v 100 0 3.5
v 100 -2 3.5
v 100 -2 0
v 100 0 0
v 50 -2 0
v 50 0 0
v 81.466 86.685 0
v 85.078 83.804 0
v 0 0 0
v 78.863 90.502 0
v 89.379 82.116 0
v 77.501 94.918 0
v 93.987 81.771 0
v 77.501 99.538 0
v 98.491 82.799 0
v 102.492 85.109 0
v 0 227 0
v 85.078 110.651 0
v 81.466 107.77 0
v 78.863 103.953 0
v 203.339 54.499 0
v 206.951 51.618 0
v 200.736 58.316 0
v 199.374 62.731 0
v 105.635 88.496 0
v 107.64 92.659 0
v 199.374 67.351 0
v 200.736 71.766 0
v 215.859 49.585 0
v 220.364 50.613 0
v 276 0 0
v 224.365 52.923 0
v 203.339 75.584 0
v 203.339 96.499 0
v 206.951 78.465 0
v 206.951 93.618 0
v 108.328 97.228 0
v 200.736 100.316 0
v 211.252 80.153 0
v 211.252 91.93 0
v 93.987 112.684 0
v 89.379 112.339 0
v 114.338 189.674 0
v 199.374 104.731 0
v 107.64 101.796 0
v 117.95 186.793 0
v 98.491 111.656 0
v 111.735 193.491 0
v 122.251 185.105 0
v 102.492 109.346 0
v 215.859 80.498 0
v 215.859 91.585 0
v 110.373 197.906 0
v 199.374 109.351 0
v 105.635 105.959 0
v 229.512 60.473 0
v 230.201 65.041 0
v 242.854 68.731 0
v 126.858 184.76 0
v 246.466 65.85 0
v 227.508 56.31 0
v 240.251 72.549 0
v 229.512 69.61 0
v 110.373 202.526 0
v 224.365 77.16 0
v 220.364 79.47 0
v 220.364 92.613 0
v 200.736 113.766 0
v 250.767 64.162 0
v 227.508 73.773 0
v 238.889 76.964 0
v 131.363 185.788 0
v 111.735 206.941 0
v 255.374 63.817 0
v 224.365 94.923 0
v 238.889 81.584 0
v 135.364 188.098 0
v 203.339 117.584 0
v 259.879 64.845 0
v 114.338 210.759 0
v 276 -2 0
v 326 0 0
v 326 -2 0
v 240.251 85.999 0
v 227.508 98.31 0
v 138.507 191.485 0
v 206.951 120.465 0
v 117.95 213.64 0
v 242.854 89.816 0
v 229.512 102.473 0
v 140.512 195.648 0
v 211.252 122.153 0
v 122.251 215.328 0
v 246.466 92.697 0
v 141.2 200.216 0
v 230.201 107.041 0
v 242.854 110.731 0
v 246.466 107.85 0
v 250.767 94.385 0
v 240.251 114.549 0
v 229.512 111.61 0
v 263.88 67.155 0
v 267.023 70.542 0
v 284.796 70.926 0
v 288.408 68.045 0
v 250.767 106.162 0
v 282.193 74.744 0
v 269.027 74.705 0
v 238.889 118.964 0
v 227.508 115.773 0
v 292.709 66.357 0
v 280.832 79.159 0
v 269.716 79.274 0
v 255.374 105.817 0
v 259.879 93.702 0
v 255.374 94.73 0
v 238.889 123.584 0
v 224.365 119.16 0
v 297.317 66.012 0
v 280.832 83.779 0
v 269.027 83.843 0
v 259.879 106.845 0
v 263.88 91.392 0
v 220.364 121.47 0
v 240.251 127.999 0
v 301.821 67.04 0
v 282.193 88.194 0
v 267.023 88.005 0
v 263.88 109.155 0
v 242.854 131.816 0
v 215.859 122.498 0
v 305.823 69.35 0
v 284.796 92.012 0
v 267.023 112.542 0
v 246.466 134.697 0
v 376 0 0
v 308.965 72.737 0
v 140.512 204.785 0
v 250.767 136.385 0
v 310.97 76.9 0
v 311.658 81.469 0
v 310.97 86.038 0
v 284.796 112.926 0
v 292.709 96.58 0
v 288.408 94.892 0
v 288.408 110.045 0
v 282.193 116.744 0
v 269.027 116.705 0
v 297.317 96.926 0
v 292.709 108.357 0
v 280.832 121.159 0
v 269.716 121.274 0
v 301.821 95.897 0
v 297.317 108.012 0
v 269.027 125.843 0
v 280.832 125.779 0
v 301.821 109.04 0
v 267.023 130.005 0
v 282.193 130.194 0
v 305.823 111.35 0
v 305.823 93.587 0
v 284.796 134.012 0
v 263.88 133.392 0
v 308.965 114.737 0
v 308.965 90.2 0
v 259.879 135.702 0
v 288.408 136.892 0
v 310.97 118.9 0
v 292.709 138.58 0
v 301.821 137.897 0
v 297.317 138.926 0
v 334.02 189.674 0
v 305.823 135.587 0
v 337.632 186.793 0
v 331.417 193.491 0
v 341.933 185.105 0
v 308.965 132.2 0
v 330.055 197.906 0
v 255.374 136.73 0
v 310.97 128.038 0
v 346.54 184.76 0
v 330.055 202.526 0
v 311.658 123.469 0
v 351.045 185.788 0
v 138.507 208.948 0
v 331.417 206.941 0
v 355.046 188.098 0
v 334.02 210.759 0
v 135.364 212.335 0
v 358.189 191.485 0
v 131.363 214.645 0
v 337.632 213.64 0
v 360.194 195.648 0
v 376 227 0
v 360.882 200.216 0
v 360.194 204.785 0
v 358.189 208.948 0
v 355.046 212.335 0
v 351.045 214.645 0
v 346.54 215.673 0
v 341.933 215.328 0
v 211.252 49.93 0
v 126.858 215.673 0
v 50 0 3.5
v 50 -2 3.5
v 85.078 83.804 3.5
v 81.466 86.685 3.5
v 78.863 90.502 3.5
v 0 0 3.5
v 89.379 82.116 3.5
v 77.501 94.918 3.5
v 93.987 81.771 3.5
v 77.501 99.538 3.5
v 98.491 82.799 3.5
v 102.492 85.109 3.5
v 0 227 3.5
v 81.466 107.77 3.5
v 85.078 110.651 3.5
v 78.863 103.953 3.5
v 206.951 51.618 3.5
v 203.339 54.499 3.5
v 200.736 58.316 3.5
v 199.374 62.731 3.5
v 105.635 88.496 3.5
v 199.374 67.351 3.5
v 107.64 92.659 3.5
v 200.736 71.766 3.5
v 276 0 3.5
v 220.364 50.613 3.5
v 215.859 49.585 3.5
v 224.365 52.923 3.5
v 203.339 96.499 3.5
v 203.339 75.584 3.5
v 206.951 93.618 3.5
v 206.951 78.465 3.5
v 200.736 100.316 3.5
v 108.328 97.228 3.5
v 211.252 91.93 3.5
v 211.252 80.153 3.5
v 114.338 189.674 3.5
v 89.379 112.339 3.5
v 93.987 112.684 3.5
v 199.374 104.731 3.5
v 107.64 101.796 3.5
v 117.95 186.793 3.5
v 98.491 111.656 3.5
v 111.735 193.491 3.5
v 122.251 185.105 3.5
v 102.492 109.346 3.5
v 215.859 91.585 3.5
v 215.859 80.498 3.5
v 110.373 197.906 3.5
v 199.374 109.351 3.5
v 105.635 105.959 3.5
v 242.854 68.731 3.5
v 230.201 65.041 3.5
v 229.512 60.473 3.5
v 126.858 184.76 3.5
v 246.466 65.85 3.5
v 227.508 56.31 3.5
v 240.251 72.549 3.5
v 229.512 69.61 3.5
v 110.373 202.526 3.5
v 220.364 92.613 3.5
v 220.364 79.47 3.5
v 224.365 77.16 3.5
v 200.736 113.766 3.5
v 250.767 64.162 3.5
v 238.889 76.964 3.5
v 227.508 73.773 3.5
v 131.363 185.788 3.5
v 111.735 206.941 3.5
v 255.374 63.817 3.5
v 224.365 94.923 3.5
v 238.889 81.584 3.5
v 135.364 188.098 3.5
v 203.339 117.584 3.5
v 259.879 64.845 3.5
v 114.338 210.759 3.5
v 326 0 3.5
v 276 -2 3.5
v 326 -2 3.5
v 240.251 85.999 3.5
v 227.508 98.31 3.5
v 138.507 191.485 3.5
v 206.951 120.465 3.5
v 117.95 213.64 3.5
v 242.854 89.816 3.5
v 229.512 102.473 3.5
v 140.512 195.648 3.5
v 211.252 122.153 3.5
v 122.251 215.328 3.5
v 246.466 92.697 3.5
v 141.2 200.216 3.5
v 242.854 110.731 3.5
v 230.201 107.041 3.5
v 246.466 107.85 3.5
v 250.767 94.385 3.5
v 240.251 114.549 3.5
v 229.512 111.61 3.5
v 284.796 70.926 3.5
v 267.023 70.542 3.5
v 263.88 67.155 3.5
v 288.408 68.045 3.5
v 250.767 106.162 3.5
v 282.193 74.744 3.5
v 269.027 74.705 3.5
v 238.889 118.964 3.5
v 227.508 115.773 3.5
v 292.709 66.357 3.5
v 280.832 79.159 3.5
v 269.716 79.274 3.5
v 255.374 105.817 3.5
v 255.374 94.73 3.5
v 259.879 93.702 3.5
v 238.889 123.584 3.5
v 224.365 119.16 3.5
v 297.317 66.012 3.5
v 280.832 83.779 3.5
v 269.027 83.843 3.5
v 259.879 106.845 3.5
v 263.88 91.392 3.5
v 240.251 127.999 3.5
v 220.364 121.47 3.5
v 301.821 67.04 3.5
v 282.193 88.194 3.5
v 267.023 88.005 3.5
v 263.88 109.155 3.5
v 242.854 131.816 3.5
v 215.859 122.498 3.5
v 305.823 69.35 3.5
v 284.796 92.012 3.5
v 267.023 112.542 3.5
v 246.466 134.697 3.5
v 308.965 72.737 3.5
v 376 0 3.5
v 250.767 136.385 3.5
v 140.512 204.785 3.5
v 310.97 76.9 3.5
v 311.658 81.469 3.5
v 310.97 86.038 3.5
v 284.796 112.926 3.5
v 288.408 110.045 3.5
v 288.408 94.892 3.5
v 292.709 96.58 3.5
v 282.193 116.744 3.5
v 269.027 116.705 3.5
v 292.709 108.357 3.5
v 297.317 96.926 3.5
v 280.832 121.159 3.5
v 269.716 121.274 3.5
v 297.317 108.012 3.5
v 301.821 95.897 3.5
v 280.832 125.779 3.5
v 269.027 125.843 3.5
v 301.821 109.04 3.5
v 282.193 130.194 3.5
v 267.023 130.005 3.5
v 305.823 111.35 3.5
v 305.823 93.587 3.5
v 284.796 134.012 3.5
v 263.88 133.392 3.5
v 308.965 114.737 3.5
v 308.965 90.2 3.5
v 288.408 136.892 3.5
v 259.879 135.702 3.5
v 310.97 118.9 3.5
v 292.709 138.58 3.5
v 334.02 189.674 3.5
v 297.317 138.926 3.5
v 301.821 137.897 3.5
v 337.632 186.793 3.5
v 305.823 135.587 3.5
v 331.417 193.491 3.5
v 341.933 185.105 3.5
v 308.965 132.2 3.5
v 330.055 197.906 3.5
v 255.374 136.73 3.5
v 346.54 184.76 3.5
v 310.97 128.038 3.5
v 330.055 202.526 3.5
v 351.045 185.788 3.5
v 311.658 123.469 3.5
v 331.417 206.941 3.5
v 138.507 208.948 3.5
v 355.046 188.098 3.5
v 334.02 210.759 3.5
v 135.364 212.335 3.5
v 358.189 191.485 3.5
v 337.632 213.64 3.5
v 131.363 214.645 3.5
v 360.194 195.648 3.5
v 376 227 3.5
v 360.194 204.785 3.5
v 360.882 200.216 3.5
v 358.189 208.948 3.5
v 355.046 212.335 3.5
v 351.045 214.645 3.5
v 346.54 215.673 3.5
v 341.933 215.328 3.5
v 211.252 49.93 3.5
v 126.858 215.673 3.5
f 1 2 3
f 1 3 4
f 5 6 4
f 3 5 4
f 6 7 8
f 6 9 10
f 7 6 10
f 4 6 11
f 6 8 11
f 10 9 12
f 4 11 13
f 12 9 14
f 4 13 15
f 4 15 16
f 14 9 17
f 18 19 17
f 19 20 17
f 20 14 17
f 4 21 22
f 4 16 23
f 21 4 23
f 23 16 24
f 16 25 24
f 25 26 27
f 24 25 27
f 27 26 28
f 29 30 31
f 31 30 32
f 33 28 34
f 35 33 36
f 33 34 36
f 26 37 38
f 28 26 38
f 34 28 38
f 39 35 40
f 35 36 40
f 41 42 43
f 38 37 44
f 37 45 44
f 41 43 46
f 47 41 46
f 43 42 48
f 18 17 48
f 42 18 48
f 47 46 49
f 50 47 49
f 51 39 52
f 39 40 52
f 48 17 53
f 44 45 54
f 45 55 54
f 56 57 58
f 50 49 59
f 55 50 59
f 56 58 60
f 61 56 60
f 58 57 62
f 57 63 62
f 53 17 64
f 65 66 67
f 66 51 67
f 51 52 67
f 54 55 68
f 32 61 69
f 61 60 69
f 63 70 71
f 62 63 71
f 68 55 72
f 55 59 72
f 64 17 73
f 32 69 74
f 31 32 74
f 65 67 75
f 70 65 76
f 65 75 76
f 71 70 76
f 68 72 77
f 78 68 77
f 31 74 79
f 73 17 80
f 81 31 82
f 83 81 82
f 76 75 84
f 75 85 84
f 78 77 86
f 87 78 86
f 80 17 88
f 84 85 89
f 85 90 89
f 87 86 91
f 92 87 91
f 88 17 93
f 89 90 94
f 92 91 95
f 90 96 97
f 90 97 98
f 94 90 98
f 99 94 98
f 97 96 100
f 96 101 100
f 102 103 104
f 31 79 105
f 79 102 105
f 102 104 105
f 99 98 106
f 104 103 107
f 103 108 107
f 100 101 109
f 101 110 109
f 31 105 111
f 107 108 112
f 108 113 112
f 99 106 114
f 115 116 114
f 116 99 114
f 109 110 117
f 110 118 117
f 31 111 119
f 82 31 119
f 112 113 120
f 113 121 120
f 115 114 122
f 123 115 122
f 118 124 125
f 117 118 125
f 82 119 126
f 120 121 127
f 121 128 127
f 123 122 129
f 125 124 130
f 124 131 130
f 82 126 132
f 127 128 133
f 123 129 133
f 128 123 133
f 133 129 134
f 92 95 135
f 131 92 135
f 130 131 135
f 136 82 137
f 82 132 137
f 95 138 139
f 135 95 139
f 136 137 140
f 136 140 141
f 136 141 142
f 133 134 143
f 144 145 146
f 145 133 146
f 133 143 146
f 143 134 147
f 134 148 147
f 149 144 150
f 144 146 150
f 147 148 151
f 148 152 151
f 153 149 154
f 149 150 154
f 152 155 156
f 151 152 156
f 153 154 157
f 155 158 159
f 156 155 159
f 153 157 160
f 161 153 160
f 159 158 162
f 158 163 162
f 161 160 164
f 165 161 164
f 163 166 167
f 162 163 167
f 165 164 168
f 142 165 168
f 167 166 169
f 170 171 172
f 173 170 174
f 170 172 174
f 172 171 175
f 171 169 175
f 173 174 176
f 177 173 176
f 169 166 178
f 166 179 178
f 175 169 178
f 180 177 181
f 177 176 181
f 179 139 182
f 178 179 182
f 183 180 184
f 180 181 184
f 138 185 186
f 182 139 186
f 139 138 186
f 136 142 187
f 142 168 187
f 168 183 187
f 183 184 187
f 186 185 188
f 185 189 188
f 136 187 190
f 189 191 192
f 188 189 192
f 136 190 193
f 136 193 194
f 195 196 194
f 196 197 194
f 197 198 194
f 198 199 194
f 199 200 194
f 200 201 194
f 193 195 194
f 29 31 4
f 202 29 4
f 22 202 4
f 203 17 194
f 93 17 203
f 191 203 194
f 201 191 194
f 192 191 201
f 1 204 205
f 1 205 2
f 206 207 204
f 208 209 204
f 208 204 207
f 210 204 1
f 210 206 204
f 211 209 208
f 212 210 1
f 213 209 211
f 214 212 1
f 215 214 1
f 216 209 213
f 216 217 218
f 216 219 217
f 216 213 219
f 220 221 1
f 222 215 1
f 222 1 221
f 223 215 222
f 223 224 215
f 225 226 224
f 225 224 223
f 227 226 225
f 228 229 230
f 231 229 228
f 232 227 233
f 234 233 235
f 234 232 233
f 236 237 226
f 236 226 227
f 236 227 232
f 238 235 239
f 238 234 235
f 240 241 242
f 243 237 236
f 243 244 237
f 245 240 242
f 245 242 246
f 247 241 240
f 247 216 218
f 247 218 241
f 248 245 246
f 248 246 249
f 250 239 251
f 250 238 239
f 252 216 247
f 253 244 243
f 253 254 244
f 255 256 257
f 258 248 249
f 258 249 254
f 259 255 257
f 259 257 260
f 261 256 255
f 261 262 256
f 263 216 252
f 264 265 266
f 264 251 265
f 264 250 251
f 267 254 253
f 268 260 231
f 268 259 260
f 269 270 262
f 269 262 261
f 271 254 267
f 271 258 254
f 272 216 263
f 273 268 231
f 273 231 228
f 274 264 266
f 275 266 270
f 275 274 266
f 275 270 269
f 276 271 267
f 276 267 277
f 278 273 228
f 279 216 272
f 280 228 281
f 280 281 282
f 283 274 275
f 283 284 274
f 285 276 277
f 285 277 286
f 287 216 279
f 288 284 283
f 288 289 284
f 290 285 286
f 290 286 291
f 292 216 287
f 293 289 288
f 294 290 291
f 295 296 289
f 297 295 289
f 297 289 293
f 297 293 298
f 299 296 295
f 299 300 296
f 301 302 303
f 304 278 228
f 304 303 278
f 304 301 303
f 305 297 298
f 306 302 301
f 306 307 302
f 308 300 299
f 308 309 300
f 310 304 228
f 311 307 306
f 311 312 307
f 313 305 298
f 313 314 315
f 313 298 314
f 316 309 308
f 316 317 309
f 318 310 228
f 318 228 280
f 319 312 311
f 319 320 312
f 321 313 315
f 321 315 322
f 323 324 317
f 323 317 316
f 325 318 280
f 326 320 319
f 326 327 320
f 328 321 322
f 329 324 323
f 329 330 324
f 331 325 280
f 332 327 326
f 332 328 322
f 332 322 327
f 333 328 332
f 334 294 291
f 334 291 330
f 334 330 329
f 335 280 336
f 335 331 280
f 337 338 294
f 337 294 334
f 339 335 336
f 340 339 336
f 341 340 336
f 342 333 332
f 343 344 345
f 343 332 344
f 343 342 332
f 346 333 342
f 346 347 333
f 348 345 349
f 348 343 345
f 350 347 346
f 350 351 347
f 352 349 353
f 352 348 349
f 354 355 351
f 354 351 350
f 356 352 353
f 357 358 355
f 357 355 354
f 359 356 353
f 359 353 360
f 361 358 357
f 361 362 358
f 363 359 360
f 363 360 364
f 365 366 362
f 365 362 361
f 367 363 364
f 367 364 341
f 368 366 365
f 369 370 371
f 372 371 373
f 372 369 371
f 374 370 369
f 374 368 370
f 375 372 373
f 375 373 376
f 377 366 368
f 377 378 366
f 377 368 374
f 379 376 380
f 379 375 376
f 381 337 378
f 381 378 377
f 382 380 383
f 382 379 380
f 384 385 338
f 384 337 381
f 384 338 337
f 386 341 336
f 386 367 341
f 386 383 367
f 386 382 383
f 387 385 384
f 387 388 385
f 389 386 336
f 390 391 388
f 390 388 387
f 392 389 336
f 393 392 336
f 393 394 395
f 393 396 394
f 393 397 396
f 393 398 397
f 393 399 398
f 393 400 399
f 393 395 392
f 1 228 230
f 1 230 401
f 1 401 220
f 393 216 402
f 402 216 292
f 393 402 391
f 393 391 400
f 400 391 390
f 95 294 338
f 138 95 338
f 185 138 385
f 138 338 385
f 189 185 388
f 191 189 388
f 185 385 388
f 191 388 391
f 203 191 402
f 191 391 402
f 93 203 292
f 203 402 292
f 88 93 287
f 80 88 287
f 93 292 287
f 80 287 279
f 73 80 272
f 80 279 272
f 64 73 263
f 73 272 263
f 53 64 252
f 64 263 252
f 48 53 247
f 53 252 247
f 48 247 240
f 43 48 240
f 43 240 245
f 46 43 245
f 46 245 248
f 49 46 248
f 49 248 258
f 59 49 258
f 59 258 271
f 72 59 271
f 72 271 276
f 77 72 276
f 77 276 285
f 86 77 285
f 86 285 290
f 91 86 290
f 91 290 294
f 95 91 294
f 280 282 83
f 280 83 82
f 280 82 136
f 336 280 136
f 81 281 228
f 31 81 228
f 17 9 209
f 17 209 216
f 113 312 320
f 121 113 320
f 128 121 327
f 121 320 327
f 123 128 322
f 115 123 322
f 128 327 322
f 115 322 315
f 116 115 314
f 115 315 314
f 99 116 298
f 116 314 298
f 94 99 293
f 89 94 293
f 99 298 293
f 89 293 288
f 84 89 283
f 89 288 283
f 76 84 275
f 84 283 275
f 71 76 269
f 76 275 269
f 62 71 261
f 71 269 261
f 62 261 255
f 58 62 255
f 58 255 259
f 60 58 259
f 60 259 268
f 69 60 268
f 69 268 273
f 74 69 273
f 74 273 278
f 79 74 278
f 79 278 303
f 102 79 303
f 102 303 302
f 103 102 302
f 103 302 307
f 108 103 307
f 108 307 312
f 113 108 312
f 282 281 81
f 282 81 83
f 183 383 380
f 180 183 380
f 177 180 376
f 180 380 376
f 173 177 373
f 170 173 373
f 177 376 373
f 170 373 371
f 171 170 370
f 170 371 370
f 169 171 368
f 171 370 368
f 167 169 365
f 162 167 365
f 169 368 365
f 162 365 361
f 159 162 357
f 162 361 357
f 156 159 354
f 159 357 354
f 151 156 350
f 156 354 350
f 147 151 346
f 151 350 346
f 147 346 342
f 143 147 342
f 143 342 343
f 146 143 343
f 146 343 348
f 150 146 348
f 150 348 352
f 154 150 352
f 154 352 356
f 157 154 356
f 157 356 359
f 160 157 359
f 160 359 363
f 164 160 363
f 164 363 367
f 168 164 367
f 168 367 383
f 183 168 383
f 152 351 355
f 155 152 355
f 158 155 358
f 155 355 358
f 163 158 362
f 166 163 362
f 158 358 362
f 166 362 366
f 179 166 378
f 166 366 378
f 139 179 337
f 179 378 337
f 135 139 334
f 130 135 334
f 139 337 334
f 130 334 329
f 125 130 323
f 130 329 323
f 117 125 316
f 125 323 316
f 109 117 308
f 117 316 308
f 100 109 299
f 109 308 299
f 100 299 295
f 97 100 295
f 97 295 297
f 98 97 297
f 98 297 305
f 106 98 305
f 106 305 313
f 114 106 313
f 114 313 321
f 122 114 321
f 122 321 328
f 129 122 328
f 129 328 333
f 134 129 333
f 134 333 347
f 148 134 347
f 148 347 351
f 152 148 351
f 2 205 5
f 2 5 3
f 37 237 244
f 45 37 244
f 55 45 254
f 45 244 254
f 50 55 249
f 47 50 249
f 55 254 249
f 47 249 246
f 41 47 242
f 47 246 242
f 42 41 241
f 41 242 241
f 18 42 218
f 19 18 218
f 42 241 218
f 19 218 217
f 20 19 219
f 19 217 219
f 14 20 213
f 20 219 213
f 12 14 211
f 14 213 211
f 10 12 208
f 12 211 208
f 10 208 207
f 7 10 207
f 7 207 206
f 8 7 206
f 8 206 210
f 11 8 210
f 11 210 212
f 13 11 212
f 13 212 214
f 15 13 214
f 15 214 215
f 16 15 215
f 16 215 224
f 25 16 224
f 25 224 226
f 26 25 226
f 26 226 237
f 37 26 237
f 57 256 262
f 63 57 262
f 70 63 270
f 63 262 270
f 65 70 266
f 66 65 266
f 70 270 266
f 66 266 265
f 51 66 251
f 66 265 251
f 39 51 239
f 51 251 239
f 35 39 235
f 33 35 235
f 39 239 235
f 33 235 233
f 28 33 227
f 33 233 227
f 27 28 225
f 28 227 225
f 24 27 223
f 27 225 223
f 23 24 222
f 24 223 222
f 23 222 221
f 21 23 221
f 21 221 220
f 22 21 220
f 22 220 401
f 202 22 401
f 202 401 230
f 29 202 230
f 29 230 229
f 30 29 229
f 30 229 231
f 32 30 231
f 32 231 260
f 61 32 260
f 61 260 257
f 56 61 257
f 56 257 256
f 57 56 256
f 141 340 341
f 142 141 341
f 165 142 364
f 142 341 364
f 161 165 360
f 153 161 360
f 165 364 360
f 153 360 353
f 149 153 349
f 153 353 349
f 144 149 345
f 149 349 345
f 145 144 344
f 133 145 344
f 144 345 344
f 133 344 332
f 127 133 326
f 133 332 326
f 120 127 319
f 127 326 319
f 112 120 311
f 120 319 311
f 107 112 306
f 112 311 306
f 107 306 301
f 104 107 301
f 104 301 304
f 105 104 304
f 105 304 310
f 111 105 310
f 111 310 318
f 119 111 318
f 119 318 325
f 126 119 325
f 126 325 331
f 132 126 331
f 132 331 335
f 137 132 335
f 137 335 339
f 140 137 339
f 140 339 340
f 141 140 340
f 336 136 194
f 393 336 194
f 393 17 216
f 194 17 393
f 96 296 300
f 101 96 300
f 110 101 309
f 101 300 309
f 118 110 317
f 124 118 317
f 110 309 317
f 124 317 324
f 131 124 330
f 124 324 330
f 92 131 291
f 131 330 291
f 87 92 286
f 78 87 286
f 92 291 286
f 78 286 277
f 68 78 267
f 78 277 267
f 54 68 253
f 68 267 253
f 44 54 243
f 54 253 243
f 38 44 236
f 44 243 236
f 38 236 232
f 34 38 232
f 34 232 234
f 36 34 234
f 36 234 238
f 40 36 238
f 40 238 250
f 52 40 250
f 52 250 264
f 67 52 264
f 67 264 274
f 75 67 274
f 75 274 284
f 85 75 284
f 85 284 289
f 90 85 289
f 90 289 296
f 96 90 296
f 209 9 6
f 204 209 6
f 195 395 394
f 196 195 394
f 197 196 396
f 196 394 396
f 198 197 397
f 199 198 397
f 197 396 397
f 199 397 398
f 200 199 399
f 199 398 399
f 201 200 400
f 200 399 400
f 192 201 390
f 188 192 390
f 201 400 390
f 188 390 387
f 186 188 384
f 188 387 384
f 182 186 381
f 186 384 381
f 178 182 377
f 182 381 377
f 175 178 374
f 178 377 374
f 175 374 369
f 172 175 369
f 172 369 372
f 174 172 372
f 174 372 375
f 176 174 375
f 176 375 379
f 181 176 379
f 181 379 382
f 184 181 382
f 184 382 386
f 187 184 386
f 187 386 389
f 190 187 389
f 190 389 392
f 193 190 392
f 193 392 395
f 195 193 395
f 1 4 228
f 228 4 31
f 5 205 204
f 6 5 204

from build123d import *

# Parameters (mm, degrees)
F0_W     = 376
F0_H     = 227
F1_DEPTH = 3.5
F2_R     = 15.5
F3_DEPTH = 25
F5_W     = 50
F5_H     = 2
F6_DEPTH = 3.5


with BuildPart() as f1:
    # F0 (on Top) → F1 (new body)
    with BuildSketch(Plane.XY):
        with Locations((188, 113.5)):
            Rectangle(F0_W, F0_H)
    extrude(amount=F1_DEPTH)

    # F2 (on face) → F3 (cut)
    with BuildSketch(Plane.XY.offset(3.5)):
        with Locations((92.828363, 97.227663)):
            Circle(F2_R)
        with Locations((125.700176, 200.216234)):
            Circle(F2_R)
        with Locations((214.700887, 107.041298)):
            Circle(F2_R)
        with Locations((214.700887, 65.041298)):
            Circle(F2_R)
        with Locations((254.215892, 79.273809)):
            Circle(F2_R)
        with Locations((254.215892, 121.273809)):
            Circle(F2_R)
        with Locations((296.158493, 123.468865)):
            Circle(F2_R)
        with Locations((296.158493, 81.468865)):
            Circle(F2_R)
        with Locations((345.382124, 200.216234)):
            Circle(F2_R)
    extrude(amount=-F3_DEPTH, mode=Mode.SUBTRACT)

    # F5 (on face) → F6 (join)
    with BuildSketch(Plane.XY.offset(3.5)):
        with Locations((75, -1)):
            Rectangle(F5_W, F5_H)
        with Locations((301, -1)):
            Rectangle(F5_W, F5_H)
    extrude(amount=-F6_DEPTH)


solid = f1.part
